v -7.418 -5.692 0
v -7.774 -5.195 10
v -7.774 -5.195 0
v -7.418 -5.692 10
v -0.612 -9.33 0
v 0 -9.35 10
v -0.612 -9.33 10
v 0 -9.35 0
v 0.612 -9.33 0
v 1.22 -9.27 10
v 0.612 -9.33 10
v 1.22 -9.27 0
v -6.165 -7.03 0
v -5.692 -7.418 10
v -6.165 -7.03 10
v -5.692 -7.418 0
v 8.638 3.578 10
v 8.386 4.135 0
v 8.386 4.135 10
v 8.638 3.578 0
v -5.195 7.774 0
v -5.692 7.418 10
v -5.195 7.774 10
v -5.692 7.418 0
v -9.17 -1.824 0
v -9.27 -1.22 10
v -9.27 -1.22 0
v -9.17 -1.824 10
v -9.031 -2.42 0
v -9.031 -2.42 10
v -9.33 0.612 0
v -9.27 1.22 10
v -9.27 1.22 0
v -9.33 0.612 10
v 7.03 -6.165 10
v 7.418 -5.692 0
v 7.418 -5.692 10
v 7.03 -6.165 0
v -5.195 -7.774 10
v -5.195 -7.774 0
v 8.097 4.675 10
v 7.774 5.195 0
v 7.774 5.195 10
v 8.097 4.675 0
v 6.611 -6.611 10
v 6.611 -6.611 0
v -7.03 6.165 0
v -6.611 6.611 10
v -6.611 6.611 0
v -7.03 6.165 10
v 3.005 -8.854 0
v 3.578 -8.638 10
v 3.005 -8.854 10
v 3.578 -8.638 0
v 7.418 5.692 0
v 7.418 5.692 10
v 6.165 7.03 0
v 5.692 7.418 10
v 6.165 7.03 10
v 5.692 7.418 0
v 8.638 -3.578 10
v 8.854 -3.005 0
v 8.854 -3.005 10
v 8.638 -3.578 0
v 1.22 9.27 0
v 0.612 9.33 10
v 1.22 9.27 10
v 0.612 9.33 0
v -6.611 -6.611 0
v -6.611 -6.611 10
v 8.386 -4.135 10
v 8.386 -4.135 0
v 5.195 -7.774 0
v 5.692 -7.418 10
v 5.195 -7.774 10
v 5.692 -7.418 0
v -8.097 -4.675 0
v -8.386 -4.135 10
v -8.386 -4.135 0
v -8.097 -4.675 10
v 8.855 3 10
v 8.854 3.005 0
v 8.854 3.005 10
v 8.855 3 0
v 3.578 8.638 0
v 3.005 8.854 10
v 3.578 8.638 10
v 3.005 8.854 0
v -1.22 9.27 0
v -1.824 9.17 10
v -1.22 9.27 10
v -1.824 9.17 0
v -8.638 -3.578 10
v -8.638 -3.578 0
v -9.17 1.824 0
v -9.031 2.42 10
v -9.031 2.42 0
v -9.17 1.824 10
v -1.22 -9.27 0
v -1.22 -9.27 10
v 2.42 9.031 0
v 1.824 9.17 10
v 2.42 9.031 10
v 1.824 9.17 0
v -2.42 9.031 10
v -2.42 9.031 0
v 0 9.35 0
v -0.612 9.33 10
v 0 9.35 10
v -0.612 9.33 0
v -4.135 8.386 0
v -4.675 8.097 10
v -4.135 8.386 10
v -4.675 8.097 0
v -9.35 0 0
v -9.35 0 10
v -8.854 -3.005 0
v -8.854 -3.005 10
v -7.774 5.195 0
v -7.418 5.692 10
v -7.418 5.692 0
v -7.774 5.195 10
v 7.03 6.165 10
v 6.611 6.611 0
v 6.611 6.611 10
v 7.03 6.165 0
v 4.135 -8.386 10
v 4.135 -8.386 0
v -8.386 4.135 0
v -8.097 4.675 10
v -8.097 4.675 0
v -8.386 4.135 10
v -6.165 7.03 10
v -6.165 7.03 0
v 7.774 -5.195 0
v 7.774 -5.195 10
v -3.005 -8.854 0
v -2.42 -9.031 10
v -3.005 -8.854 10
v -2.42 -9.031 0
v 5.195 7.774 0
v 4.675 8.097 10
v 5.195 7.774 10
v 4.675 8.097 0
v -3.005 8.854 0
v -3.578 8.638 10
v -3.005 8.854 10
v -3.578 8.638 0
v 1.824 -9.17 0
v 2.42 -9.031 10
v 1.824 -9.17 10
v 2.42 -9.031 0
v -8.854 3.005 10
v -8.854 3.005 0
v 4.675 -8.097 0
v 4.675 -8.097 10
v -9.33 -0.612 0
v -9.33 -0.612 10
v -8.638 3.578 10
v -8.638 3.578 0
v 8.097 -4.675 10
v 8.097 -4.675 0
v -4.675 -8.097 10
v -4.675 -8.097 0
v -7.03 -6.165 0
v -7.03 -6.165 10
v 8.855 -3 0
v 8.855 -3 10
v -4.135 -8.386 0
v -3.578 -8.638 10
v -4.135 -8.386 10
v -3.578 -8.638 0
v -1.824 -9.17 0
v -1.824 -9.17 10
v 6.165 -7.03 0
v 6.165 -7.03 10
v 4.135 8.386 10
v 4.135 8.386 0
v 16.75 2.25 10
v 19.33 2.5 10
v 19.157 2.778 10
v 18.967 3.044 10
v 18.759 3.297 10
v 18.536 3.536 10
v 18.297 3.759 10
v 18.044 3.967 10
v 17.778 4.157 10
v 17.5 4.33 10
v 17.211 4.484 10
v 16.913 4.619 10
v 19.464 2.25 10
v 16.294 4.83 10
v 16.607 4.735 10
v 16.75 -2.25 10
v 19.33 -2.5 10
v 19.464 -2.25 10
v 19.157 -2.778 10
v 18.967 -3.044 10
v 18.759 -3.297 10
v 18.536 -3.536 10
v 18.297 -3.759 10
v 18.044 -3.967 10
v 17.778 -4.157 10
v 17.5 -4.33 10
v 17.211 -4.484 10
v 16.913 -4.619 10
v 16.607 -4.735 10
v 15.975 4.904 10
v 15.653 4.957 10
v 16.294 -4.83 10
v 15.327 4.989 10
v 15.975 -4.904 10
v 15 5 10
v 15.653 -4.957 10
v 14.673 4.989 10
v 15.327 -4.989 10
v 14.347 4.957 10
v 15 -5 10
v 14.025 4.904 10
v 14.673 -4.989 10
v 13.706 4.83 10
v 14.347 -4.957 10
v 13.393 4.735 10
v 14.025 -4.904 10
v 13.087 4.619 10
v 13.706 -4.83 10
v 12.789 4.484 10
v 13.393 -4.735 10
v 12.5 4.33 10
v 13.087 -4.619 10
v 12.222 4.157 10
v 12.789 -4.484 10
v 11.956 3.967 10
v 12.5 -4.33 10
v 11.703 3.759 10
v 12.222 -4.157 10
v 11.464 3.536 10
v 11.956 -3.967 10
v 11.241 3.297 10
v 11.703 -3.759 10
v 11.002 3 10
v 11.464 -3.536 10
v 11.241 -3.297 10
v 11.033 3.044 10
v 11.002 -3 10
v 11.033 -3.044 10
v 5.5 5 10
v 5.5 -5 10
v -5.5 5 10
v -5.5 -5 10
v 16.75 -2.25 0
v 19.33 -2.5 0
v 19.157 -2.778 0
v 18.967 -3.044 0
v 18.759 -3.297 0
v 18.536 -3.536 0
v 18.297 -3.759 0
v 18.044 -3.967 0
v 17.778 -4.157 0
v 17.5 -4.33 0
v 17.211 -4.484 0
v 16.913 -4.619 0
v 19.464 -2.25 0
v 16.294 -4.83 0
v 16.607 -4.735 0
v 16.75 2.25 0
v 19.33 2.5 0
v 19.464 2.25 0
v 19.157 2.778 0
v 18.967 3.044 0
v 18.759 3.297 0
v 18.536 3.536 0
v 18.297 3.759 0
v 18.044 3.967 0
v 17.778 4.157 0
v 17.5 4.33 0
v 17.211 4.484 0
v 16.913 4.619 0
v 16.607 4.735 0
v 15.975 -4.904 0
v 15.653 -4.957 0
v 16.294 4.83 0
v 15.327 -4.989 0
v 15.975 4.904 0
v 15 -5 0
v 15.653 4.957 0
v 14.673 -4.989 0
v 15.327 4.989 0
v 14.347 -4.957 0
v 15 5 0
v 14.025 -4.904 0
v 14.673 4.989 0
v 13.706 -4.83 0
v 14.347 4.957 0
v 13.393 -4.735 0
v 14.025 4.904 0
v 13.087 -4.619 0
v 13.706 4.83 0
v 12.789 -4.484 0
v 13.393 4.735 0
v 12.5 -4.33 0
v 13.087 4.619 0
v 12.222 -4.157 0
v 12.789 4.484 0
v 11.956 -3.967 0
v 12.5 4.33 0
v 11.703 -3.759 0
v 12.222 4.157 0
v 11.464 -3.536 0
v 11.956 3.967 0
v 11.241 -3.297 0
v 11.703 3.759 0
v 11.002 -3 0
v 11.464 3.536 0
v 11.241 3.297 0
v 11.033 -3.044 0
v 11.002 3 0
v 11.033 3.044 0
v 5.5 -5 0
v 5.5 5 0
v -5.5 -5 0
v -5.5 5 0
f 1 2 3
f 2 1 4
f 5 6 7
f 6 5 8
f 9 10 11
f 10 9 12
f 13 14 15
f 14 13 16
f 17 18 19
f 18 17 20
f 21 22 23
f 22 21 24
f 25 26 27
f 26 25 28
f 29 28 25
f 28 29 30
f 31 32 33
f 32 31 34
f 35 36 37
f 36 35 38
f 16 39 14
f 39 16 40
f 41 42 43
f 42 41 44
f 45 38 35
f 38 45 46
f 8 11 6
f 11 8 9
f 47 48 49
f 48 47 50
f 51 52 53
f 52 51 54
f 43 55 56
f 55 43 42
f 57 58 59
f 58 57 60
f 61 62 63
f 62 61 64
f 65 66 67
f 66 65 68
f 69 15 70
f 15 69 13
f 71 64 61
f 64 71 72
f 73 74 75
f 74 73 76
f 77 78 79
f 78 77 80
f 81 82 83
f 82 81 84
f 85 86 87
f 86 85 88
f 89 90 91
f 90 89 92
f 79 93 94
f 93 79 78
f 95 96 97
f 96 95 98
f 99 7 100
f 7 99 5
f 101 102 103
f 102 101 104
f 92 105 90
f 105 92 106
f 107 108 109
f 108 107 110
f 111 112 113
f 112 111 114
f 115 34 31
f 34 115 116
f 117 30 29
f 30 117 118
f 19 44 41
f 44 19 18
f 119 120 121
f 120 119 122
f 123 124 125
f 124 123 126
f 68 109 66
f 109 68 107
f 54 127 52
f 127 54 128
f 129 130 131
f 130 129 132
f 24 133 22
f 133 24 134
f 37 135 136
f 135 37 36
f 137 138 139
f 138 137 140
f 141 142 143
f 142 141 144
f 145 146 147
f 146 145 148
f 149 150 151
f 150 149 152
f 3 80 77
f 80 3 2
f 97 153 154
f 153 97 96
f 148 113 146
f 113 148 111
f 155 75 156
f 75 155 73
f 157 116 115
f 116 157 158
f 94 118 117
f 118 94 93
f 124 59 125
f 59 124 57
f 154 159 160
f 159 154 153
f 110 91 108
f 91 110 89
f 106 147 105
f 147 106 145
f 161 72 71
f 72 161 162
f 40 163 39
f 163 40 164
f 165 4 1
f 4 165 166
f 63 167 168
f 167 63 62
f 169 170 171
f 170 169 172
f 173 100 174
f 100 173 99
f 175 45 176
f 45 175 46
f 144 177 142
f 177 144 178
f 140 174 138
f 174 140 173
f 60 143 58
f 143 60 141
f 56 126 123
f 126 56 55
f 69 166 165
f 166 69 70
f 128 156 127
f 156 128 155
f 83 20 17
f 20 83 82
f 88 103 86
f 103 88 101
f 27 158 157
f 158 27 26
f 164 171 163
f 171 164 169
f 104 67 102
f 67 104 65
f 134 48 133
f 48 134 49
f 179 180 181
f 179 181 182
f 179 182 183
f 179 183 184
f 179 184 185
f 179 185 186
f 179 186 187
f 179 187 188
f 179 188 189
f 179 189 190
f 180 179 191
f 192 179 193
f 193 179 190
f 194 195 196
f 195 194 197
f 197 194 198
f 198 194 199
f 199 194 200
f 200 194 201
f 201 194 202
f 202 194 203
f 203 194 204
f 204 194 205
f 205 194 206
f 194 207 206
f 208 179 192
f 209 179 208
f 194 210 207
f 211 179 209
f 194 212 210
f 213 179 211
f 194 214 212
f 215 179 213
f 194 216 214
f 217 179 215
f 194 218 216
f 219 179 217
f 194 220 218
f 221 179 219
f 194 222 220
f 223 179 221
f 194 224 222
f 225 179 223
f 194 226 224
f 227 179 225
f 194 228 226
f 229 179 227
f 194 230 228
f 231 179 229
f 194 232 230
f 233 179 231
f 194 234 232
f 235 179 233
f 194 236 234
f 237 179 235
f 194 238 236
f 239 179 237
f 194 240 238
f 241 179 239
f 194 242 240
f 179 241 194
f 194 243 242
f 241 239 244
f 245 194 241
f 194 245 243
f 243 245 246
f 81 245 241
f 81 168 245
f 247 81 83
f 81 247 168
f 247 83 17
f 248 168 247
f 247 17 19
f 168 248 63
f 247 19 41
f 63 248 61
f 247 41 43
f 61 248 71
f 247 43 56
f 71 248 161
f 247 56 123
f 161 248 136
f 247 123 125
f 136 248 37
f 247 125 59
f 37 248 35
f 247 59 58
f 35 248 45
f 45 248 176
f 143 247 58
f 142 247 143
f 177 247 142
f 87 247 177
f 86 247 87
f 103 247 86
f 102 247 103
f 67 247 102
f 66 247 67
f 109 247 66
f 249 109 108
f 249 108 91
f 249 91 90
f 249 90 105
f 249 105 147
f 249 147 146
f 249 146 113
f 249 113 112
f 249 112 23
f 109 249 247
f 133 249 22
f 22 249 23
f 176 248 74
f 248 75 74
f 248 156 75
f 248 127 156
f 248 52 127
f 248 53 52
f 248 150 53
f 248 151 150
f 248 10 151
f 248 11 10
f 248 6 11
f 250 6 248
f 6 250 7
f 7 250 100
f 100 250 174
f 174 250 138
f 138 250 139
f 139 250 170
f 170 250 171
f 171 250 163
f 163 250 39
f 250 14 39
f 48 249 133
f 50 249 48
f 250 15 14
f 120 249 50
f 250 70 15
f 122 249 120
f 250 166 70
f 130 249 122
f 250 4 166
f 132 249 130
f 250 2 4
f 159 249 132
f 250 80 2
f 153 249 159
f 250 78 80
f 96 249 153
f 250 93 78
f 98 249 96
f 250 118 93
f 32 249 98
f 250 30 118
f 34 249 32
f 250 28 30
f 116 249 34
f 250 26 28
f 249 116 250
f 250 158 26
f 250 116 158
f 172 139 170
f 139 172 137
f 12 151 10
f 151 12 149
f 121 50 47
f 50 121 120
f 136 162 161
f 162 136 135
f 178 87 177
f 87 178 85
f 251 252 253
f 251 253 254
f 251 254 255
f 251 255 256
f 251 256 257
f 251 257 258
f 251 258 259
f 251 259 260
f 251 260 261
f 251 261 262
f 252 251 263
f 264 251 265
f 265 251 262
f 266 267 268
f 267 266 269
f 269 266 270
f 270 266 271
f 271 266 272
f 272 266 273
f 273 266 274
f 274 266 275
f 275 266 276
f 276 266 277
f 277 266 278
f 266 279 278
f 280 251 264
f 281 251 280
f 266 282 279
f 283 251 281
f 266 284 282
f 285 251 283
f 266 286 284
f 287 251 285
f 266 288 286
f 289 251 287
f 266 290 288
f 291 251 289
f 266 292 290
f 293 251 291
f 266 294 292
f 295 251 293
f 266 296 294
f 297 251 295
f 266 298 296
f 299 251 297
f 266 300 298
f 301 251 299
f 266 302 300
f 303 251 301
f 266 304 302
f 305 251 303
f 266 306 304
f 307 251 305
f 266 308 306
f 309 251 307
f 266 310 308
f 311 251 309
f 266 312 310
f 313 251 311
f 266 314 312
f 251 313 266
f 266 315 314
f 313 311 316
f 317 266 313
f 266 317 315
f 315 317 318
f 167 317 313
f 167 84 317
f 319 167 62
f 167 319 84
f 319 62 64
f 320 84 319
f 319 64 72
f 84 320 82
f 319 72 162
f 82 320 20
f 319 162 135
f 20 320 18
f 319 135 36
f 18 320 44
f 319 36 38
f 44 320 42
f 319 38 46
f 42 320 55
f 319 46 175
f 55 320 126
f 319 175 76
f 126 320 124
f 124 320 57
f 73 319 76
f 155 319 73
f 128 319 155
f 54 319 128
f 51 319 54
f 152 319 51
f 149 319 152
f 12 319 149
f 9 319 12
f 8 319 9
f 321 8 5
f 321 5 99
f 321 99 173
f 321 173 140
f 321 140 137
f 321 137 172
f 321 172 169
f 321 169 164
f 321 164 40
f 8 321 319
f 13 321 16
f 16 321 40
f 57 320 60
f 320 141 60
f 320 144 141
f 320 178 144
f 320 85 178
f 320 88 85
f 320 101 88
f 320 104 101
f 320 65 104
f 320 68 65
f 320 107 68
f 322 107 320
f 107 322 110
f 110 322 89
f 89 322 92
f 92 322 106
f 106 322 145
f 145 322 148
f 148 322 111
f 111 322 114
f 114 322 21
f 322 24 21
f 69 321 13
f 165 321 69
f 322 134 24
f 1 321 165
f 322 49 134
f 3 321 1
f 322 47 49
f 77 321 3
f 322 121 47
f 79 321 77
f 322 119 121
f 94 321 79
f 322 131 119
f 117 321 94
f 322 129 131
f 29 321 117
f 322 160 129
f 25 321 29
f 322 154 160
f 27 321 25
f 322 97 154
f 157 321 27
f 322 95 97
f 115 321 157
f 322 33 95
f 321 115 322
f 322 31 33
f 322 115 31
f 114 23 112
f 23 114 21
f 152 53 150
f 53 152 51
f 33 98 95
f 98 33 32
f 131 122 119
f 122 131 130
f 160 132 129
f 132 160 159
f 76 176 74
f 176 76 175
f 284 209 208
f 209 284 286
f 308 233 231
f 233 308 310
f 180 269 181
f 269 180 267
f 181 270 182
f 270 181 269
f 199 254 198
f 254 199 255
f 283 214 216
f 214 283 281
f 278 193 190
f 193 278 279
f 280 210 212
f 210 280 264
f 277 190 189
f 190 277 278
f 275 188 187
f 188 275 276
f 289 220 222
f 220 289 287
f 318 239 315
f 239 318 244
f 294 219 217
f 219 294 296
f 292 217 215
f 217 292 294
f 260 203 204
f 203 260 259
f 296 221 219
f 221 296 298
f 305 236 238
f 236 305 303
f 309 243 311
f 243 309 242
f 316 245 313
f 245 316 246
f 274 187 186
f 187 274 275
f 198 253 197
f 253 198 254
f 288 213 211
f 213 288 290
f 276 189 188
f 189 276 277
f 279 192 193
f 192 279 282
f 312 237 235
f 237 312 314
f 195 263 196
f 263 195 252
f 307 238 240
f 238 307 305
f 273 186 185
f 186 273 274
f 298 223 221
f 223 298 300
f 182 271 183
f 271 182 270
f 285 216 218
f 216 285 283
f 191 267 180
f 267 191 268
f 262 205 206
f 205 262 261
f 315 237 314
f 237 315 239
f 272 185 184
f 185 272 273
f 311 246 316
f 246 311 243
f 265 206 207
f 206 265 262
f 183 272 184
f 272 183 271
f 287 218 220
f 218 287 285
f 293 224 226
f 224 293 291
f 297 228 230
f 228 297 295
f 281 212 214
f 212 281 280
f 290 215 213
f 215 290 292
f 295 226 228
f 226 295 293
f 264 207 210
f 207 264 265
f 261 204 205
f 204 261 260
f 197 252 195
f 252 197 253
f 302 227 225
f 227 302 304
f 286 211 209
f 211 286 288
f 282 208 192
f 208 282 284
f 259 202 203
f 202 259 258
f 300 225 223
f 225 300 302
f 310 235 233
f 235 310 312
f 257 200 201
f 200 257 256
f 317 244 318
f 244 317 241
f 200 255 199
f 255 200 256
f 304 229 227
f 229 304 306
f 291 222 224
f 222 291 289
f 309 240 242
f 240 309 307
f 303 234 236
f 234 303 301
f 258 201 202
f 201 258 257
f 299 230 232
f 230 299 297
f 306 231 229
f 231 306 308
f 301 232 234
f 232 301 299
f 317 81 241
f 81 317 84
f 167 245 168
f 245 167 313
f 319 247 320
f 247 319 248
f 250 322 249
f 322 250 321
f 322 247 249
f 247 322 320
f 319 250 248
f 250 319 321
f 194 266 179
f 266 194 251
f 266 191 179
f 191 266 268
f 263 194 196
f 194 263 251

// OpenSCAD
// Tubing organiser clip - printed flat, snaps onto a 12.7 mm stand rod and holds a small piece of tubing next to it.
// Units: mm

$fn = 96;

// ---- Stand rod ring ----
stand_d  = 12.7;   // stand rod diameter (ring inner diameter)
stand_w  = 3;      // ring wall thickness
stand_r  = stand_d / 2 + stand_w;  // ring outer radius
stand_x0 = 0;      // ring centre X
stand_y0 = 0;      // ring centre Y
stand_wid = 10;    // opening width cut out of the -X side

// ---- Tubing ring ----
tube_d   = 6;      // tubing inner diameter
tube_w   = 2;      // ring wall thickness
tube_r   = tube_d / 2 + tube_w;  // ring outer radius
tube_x0  = 15;     // ring centre X
tube_y0  = 0;      // ring centre Y
tube_wid = 4.5;    // opening width cut out of the +X side

// ---- Bridge ----
bridge_w   = 6;    // bridge width (Y)
bridge_x0  = 8;    // bridge start X
bridge_x1  = 12;   // bridge end X

// ---- Cut clearance ----
eps = 0.5;         // extension of cutters past faces

difference() {
    union() {
        // Stand rod ring, centred at origin
        cylinder(r = stand_r, h = 10);

        // Tubing ring, centred at x = 15
        translate([tube_x0, tube_y0, 0])
            cylinder(r = tube_r, h = 10);

        // Solid bridge between x = 8 and x = 12
        translate([bridge_x0, -bridge_w / 2, 0])
            cube([bridge_x1 - bridge_x0, bridge_w, 10]);
    }

    // Opening in stand rod ring: everything with x < 0 and -5 < y < 5
    translate([stand_x0 - stand_wid / 2 - eps, -stand_wid / 2, 0])
        cube([stand_wid + 2 * eps, stand_wid, 10 + 2 * eps]);

    // Opening in tubing ring: x > 15 and -2.25 < y < 2.25
    translate([tube_x0 + tube_wid / 2 - eps, -tube_wid / 2, 0])
        cube([tube_wid + 2 * eps, tube_wid, 10 + 2 * eps]);
}
